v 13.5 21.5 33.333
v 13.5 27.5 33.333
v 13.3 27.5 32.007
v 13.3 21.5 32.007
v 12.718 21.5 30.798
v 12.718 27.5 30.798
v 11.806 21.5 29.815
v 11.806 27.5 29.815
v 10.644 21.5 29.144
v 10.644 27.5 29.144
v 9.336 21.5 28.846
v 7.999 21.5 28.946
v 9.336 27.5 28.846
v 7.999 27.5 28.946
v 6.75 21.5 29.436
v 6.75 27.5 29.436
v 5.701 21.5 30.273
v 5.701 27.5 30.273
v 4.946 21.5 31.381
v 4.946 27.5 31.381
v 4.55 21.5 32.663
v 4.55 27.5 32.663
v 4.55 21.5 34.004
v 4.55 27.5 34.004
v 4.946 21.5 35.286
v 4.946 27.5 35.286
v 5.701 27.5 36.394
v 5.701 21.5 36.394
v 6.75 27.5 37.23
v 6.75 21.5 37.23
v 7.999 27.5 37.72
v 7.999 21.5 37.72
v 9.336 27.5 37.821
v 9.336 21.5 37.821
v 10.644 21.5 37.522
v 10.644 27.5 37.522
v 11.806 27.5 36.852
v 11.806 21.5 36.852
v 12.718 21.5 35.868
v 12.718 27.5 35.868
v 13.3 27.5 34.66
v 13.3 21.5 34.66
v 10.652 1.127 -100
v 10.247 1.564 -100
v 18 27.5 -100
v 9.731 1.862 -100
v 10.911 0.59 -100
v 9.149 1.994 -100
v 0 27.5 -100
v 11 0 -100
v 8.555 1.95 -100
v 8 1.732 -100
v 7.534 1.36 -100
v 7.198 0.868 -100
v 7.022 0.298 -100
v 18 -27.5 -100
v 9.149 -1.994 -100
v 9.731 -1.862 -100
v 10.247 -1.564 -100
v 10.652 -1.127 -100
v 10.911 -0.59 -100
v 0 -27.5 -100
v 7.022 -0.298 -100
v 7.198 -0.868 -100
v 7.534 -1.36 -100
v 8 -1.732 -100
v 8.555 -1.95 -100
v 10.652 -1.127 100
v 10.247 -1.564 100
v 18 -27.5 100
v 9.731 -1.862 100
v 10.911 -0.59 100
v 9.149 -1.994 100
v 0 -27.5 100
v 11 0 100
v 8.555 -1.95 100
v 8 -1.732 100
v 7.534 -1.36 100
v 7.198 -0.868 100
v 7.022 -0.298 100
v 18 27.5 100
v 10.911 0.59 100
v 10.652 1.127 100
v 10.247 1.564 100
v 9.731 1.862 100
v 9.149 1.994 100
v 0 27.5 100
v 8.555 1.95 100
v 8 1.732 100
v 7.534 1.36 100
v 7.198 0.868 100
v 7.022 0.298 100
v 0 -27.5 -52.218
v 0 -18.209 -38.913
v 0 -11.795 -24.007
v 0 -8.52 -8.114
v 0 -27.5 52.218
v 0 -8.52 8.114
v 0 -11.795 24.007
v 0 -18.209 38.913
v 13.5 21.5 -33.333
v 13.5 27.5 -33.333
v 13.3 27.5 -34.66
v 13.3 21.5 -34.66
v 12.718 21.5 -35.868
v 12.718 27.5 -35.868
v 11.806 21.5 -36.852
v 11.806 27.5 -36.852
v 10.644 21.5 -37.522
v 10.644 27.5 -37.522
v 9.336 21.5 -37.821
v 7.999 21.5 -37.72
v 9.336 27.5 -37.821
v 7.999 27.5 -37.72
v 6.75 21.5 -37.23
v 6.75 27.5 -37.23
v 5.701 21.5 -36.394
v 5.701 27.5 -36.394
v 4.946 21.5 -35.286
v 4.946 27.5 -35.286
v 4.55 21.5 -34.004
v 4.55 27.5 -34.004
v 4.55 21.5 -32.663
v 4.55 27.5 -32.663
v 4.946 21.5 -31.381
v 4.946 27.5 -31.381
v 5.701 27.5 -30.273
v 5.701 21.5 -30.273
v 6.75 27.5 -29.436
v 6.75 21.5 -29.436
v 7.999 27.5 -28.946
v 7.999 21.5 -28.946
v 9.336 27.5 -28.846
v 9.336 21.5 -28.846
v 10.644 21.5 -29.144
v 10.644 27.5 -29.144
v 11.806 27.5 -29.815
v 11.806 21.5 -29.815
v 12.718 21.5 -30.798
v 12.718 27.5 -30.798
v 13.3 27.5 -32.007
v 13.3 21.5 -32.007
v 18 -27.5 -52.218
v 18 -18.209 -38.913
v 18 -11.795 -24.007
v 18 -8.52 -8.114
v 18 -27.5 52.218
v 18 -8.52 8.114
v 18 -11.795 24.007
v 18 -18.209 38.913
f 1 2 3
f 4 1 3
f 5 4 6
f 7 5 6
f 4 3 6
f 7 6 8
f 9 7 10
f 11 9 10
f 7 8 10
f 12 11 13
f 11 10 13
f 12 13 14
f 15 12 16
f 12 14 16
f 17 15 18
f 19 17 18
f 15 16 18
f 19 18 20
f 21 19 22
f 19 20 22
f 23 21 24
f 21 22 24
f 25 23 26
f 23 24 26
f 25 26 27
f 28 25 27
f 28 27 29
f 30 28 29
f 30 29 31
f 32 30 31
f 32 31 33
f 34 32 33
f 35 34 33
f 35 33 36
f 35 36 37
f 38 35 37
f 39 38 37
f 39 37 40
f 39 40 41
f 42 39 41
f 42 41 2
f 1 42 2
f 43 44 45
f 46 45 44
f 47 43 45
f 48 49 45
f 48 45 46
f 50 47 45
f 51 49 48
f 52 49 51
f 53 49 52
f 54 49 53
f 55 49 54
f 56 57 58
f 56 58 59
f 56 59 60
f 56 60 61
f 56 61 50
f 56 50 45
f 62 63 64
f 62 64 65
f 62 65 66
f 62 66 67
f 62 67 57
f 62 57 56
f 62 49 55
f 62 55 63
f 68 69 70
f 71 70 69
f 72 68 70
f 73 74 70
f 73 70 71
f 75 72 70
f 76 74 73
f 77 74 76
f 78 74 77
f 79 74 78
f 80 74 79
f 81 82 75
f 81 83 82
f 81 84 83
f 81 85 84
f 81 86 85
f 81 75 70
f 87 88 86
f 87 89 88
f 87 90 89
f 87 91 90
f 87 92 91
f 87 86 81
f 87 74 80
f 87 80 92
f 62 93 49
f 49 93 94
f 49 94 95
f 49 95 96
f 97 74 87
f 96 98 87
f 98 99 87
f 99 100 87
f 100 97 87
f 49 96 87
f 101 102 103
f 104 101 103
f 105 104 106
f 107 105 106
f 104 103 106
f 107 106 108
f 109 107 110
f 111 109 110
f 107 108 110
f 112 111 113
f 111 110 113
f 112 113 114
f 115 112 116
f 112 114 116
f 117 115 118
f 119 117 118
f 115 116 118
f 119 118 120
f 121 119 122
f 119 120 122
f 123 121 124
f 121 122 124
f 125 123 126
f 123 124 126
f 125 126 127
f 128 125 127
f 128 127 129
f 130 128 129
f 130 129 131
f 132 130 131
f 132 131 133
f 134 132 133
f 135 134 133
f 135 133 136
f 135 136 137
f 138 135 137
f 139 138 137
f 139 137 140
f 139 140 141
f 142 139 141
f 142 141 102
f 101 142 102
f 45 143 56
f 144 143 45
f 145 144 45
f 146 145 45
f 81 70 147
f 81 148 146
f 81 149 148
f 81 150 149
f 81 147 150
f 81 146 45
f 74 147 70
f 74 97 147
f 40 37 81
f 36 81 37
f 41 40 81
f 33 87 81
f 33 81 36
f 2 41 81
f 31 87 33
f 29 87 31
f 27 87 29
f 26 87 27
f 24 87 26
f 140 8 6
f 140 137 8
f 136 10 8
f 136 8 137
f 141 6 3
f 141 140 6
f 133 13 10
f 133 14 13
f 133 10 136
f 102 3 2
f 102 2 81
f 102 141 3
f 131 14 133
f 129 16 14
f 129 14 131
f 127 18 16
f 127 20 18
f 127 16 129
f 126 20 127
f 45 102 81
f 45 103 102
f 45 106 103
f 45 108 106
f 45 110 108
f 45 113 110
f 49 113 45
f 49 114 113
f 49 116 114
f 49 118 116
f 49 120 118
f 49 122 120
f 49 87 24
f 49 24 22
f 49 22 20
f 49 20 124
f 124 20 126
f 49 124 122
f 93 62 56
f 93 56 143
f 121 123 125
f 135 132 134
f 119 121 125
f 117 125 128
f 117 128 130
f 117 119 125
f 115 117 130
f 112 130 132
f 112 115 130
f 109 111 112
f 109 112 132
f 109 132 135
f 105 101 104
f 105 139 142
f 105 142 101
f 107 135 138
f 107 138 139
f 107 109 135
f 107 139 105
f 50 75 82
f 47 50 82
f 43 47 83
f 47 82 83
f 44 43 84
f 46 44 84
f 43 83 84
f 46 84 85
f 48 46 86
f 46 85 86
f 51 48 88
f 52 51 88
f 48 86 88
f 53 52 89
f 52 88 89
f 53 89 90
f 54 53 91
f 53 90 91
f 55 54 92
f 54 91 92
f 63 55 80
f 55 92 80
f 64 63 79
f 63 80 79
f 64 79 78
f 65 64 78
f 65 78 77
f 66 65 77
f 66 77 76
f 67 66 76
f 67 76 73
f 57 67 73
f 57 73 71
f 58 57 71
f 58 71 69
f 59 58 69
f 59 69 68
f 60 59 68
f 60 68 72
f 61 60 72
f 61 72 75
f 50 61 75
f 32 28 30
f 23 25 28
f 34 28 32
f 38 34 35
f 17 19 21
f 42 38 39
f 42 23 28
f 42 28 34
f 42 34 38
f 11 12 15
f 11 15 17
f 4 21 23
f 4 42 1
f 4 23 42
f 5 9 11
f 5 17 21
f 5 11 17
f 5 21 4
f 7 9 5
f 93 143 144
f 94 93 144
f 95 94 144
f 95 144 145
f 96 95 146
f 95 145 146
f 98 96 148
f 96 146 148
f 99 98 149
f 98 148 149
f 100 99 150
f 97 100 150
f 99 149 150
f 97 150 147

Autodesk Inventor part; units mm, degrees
ref_plane "YZ Plane" through (0, 0, 0) normal (1, 0, 0) x (0, 1, 0)
ref_plane "XZ Plane" through (0, 0, 0) normal (0, 1, 0) x (-1, 0, 0)
ref_plane "XY Plane" through (0, 0, 0) normal (0, 0, 1) x (1, 0, 0)
sketch "Boceto1" plane through (0, 0, 0) normal (1, 0, 0) x (0, 1, 0)
  line L0 (27.5, -100) -> (-27.5, -100)
  line L1 (-27.5, -100) -> (-27.5, 100)
  line L2 (-27.5, 100) -> (27.5, 100)
  line L3 (27.5, 100) -> (27.5, -100)
  line L4 (27.5, -100) -> (-27.5, 100) construction
  line L5 (-27.5, -100) -> (27.5, 100) construction
  point P0 (0, 0)
  dimension "alto" = 55
  dimension "ancho" = 200
extrude "Extrusión1" add sketch "Boceto1" along normal blind 18
sketch "Boceto2" plane through (0, 27.5, 100) normal (0, 1, 0) x (1, 0, 0)
  circle A0 centre (9, 66.6667) radius 4.5
  circle A1 centre (9, 133.3333) radius 4.5
  line L0 (0, 0) -> (18, 0) projected
  line L1 (0, 200) -> (18, 200) projected
  line L2 (18, 200) -> (18, 0) projected
  point P0 (0, 100)
  dimension "d4" = 9
  dimension "d5" = 9
  dimension "alto1" = 66.6667
  dimension "d7" = 66.6667
  dimension "d8" = 9
  dimension "d9" = 9
extrude "Extrusión2" cut sketch "Boceto2" against normal blind 6
sketch "Boceto3" plane through (18, 0, 0) normal (1, 0, 0) x (0, 0, -1)
  circle A0 centre (0, -88.1077) radius 80
  line L0 (-100, 27.5) -> (-100, -27.5) projected
  point P0 (0, 0)
  dimension "radio" = 160
  dimension "d14" = 100
extrude "Extrusión3" cut sketch "Boceto3" against normal blind 18
sketch "Boceto4" plane through (0, -27.5, 100) normal (0, 0, 1) x (1, 0, 0)
  circle A0 centre (9, 27.5) radius 2
  line L0 (0, 55) -> (18, 55) projected
  point P0 (0, 27.5)
  point P1 (9, 55)
  dimension "d17" = 4
  dimension "d18" = 27.5
extrude "Extrusión4" cut sketch "Boceto4" against normal blind 290
equation "\"d4\" = 0.5 * grosor"
equation "\"d5\" = d4"
equation "\"d7\" = alto1"
equation "\"d8\" = d9"
equation "\"d9\" = 0.5 * grosor"
equation "\"d10\" = 0.333333 * grosor"
equation "\"d14\" = 0.5 * ancho"
equation "\"d15\" = grosor"
equation "\"grosor\" = 18"
properties part number "APM_003-1"
